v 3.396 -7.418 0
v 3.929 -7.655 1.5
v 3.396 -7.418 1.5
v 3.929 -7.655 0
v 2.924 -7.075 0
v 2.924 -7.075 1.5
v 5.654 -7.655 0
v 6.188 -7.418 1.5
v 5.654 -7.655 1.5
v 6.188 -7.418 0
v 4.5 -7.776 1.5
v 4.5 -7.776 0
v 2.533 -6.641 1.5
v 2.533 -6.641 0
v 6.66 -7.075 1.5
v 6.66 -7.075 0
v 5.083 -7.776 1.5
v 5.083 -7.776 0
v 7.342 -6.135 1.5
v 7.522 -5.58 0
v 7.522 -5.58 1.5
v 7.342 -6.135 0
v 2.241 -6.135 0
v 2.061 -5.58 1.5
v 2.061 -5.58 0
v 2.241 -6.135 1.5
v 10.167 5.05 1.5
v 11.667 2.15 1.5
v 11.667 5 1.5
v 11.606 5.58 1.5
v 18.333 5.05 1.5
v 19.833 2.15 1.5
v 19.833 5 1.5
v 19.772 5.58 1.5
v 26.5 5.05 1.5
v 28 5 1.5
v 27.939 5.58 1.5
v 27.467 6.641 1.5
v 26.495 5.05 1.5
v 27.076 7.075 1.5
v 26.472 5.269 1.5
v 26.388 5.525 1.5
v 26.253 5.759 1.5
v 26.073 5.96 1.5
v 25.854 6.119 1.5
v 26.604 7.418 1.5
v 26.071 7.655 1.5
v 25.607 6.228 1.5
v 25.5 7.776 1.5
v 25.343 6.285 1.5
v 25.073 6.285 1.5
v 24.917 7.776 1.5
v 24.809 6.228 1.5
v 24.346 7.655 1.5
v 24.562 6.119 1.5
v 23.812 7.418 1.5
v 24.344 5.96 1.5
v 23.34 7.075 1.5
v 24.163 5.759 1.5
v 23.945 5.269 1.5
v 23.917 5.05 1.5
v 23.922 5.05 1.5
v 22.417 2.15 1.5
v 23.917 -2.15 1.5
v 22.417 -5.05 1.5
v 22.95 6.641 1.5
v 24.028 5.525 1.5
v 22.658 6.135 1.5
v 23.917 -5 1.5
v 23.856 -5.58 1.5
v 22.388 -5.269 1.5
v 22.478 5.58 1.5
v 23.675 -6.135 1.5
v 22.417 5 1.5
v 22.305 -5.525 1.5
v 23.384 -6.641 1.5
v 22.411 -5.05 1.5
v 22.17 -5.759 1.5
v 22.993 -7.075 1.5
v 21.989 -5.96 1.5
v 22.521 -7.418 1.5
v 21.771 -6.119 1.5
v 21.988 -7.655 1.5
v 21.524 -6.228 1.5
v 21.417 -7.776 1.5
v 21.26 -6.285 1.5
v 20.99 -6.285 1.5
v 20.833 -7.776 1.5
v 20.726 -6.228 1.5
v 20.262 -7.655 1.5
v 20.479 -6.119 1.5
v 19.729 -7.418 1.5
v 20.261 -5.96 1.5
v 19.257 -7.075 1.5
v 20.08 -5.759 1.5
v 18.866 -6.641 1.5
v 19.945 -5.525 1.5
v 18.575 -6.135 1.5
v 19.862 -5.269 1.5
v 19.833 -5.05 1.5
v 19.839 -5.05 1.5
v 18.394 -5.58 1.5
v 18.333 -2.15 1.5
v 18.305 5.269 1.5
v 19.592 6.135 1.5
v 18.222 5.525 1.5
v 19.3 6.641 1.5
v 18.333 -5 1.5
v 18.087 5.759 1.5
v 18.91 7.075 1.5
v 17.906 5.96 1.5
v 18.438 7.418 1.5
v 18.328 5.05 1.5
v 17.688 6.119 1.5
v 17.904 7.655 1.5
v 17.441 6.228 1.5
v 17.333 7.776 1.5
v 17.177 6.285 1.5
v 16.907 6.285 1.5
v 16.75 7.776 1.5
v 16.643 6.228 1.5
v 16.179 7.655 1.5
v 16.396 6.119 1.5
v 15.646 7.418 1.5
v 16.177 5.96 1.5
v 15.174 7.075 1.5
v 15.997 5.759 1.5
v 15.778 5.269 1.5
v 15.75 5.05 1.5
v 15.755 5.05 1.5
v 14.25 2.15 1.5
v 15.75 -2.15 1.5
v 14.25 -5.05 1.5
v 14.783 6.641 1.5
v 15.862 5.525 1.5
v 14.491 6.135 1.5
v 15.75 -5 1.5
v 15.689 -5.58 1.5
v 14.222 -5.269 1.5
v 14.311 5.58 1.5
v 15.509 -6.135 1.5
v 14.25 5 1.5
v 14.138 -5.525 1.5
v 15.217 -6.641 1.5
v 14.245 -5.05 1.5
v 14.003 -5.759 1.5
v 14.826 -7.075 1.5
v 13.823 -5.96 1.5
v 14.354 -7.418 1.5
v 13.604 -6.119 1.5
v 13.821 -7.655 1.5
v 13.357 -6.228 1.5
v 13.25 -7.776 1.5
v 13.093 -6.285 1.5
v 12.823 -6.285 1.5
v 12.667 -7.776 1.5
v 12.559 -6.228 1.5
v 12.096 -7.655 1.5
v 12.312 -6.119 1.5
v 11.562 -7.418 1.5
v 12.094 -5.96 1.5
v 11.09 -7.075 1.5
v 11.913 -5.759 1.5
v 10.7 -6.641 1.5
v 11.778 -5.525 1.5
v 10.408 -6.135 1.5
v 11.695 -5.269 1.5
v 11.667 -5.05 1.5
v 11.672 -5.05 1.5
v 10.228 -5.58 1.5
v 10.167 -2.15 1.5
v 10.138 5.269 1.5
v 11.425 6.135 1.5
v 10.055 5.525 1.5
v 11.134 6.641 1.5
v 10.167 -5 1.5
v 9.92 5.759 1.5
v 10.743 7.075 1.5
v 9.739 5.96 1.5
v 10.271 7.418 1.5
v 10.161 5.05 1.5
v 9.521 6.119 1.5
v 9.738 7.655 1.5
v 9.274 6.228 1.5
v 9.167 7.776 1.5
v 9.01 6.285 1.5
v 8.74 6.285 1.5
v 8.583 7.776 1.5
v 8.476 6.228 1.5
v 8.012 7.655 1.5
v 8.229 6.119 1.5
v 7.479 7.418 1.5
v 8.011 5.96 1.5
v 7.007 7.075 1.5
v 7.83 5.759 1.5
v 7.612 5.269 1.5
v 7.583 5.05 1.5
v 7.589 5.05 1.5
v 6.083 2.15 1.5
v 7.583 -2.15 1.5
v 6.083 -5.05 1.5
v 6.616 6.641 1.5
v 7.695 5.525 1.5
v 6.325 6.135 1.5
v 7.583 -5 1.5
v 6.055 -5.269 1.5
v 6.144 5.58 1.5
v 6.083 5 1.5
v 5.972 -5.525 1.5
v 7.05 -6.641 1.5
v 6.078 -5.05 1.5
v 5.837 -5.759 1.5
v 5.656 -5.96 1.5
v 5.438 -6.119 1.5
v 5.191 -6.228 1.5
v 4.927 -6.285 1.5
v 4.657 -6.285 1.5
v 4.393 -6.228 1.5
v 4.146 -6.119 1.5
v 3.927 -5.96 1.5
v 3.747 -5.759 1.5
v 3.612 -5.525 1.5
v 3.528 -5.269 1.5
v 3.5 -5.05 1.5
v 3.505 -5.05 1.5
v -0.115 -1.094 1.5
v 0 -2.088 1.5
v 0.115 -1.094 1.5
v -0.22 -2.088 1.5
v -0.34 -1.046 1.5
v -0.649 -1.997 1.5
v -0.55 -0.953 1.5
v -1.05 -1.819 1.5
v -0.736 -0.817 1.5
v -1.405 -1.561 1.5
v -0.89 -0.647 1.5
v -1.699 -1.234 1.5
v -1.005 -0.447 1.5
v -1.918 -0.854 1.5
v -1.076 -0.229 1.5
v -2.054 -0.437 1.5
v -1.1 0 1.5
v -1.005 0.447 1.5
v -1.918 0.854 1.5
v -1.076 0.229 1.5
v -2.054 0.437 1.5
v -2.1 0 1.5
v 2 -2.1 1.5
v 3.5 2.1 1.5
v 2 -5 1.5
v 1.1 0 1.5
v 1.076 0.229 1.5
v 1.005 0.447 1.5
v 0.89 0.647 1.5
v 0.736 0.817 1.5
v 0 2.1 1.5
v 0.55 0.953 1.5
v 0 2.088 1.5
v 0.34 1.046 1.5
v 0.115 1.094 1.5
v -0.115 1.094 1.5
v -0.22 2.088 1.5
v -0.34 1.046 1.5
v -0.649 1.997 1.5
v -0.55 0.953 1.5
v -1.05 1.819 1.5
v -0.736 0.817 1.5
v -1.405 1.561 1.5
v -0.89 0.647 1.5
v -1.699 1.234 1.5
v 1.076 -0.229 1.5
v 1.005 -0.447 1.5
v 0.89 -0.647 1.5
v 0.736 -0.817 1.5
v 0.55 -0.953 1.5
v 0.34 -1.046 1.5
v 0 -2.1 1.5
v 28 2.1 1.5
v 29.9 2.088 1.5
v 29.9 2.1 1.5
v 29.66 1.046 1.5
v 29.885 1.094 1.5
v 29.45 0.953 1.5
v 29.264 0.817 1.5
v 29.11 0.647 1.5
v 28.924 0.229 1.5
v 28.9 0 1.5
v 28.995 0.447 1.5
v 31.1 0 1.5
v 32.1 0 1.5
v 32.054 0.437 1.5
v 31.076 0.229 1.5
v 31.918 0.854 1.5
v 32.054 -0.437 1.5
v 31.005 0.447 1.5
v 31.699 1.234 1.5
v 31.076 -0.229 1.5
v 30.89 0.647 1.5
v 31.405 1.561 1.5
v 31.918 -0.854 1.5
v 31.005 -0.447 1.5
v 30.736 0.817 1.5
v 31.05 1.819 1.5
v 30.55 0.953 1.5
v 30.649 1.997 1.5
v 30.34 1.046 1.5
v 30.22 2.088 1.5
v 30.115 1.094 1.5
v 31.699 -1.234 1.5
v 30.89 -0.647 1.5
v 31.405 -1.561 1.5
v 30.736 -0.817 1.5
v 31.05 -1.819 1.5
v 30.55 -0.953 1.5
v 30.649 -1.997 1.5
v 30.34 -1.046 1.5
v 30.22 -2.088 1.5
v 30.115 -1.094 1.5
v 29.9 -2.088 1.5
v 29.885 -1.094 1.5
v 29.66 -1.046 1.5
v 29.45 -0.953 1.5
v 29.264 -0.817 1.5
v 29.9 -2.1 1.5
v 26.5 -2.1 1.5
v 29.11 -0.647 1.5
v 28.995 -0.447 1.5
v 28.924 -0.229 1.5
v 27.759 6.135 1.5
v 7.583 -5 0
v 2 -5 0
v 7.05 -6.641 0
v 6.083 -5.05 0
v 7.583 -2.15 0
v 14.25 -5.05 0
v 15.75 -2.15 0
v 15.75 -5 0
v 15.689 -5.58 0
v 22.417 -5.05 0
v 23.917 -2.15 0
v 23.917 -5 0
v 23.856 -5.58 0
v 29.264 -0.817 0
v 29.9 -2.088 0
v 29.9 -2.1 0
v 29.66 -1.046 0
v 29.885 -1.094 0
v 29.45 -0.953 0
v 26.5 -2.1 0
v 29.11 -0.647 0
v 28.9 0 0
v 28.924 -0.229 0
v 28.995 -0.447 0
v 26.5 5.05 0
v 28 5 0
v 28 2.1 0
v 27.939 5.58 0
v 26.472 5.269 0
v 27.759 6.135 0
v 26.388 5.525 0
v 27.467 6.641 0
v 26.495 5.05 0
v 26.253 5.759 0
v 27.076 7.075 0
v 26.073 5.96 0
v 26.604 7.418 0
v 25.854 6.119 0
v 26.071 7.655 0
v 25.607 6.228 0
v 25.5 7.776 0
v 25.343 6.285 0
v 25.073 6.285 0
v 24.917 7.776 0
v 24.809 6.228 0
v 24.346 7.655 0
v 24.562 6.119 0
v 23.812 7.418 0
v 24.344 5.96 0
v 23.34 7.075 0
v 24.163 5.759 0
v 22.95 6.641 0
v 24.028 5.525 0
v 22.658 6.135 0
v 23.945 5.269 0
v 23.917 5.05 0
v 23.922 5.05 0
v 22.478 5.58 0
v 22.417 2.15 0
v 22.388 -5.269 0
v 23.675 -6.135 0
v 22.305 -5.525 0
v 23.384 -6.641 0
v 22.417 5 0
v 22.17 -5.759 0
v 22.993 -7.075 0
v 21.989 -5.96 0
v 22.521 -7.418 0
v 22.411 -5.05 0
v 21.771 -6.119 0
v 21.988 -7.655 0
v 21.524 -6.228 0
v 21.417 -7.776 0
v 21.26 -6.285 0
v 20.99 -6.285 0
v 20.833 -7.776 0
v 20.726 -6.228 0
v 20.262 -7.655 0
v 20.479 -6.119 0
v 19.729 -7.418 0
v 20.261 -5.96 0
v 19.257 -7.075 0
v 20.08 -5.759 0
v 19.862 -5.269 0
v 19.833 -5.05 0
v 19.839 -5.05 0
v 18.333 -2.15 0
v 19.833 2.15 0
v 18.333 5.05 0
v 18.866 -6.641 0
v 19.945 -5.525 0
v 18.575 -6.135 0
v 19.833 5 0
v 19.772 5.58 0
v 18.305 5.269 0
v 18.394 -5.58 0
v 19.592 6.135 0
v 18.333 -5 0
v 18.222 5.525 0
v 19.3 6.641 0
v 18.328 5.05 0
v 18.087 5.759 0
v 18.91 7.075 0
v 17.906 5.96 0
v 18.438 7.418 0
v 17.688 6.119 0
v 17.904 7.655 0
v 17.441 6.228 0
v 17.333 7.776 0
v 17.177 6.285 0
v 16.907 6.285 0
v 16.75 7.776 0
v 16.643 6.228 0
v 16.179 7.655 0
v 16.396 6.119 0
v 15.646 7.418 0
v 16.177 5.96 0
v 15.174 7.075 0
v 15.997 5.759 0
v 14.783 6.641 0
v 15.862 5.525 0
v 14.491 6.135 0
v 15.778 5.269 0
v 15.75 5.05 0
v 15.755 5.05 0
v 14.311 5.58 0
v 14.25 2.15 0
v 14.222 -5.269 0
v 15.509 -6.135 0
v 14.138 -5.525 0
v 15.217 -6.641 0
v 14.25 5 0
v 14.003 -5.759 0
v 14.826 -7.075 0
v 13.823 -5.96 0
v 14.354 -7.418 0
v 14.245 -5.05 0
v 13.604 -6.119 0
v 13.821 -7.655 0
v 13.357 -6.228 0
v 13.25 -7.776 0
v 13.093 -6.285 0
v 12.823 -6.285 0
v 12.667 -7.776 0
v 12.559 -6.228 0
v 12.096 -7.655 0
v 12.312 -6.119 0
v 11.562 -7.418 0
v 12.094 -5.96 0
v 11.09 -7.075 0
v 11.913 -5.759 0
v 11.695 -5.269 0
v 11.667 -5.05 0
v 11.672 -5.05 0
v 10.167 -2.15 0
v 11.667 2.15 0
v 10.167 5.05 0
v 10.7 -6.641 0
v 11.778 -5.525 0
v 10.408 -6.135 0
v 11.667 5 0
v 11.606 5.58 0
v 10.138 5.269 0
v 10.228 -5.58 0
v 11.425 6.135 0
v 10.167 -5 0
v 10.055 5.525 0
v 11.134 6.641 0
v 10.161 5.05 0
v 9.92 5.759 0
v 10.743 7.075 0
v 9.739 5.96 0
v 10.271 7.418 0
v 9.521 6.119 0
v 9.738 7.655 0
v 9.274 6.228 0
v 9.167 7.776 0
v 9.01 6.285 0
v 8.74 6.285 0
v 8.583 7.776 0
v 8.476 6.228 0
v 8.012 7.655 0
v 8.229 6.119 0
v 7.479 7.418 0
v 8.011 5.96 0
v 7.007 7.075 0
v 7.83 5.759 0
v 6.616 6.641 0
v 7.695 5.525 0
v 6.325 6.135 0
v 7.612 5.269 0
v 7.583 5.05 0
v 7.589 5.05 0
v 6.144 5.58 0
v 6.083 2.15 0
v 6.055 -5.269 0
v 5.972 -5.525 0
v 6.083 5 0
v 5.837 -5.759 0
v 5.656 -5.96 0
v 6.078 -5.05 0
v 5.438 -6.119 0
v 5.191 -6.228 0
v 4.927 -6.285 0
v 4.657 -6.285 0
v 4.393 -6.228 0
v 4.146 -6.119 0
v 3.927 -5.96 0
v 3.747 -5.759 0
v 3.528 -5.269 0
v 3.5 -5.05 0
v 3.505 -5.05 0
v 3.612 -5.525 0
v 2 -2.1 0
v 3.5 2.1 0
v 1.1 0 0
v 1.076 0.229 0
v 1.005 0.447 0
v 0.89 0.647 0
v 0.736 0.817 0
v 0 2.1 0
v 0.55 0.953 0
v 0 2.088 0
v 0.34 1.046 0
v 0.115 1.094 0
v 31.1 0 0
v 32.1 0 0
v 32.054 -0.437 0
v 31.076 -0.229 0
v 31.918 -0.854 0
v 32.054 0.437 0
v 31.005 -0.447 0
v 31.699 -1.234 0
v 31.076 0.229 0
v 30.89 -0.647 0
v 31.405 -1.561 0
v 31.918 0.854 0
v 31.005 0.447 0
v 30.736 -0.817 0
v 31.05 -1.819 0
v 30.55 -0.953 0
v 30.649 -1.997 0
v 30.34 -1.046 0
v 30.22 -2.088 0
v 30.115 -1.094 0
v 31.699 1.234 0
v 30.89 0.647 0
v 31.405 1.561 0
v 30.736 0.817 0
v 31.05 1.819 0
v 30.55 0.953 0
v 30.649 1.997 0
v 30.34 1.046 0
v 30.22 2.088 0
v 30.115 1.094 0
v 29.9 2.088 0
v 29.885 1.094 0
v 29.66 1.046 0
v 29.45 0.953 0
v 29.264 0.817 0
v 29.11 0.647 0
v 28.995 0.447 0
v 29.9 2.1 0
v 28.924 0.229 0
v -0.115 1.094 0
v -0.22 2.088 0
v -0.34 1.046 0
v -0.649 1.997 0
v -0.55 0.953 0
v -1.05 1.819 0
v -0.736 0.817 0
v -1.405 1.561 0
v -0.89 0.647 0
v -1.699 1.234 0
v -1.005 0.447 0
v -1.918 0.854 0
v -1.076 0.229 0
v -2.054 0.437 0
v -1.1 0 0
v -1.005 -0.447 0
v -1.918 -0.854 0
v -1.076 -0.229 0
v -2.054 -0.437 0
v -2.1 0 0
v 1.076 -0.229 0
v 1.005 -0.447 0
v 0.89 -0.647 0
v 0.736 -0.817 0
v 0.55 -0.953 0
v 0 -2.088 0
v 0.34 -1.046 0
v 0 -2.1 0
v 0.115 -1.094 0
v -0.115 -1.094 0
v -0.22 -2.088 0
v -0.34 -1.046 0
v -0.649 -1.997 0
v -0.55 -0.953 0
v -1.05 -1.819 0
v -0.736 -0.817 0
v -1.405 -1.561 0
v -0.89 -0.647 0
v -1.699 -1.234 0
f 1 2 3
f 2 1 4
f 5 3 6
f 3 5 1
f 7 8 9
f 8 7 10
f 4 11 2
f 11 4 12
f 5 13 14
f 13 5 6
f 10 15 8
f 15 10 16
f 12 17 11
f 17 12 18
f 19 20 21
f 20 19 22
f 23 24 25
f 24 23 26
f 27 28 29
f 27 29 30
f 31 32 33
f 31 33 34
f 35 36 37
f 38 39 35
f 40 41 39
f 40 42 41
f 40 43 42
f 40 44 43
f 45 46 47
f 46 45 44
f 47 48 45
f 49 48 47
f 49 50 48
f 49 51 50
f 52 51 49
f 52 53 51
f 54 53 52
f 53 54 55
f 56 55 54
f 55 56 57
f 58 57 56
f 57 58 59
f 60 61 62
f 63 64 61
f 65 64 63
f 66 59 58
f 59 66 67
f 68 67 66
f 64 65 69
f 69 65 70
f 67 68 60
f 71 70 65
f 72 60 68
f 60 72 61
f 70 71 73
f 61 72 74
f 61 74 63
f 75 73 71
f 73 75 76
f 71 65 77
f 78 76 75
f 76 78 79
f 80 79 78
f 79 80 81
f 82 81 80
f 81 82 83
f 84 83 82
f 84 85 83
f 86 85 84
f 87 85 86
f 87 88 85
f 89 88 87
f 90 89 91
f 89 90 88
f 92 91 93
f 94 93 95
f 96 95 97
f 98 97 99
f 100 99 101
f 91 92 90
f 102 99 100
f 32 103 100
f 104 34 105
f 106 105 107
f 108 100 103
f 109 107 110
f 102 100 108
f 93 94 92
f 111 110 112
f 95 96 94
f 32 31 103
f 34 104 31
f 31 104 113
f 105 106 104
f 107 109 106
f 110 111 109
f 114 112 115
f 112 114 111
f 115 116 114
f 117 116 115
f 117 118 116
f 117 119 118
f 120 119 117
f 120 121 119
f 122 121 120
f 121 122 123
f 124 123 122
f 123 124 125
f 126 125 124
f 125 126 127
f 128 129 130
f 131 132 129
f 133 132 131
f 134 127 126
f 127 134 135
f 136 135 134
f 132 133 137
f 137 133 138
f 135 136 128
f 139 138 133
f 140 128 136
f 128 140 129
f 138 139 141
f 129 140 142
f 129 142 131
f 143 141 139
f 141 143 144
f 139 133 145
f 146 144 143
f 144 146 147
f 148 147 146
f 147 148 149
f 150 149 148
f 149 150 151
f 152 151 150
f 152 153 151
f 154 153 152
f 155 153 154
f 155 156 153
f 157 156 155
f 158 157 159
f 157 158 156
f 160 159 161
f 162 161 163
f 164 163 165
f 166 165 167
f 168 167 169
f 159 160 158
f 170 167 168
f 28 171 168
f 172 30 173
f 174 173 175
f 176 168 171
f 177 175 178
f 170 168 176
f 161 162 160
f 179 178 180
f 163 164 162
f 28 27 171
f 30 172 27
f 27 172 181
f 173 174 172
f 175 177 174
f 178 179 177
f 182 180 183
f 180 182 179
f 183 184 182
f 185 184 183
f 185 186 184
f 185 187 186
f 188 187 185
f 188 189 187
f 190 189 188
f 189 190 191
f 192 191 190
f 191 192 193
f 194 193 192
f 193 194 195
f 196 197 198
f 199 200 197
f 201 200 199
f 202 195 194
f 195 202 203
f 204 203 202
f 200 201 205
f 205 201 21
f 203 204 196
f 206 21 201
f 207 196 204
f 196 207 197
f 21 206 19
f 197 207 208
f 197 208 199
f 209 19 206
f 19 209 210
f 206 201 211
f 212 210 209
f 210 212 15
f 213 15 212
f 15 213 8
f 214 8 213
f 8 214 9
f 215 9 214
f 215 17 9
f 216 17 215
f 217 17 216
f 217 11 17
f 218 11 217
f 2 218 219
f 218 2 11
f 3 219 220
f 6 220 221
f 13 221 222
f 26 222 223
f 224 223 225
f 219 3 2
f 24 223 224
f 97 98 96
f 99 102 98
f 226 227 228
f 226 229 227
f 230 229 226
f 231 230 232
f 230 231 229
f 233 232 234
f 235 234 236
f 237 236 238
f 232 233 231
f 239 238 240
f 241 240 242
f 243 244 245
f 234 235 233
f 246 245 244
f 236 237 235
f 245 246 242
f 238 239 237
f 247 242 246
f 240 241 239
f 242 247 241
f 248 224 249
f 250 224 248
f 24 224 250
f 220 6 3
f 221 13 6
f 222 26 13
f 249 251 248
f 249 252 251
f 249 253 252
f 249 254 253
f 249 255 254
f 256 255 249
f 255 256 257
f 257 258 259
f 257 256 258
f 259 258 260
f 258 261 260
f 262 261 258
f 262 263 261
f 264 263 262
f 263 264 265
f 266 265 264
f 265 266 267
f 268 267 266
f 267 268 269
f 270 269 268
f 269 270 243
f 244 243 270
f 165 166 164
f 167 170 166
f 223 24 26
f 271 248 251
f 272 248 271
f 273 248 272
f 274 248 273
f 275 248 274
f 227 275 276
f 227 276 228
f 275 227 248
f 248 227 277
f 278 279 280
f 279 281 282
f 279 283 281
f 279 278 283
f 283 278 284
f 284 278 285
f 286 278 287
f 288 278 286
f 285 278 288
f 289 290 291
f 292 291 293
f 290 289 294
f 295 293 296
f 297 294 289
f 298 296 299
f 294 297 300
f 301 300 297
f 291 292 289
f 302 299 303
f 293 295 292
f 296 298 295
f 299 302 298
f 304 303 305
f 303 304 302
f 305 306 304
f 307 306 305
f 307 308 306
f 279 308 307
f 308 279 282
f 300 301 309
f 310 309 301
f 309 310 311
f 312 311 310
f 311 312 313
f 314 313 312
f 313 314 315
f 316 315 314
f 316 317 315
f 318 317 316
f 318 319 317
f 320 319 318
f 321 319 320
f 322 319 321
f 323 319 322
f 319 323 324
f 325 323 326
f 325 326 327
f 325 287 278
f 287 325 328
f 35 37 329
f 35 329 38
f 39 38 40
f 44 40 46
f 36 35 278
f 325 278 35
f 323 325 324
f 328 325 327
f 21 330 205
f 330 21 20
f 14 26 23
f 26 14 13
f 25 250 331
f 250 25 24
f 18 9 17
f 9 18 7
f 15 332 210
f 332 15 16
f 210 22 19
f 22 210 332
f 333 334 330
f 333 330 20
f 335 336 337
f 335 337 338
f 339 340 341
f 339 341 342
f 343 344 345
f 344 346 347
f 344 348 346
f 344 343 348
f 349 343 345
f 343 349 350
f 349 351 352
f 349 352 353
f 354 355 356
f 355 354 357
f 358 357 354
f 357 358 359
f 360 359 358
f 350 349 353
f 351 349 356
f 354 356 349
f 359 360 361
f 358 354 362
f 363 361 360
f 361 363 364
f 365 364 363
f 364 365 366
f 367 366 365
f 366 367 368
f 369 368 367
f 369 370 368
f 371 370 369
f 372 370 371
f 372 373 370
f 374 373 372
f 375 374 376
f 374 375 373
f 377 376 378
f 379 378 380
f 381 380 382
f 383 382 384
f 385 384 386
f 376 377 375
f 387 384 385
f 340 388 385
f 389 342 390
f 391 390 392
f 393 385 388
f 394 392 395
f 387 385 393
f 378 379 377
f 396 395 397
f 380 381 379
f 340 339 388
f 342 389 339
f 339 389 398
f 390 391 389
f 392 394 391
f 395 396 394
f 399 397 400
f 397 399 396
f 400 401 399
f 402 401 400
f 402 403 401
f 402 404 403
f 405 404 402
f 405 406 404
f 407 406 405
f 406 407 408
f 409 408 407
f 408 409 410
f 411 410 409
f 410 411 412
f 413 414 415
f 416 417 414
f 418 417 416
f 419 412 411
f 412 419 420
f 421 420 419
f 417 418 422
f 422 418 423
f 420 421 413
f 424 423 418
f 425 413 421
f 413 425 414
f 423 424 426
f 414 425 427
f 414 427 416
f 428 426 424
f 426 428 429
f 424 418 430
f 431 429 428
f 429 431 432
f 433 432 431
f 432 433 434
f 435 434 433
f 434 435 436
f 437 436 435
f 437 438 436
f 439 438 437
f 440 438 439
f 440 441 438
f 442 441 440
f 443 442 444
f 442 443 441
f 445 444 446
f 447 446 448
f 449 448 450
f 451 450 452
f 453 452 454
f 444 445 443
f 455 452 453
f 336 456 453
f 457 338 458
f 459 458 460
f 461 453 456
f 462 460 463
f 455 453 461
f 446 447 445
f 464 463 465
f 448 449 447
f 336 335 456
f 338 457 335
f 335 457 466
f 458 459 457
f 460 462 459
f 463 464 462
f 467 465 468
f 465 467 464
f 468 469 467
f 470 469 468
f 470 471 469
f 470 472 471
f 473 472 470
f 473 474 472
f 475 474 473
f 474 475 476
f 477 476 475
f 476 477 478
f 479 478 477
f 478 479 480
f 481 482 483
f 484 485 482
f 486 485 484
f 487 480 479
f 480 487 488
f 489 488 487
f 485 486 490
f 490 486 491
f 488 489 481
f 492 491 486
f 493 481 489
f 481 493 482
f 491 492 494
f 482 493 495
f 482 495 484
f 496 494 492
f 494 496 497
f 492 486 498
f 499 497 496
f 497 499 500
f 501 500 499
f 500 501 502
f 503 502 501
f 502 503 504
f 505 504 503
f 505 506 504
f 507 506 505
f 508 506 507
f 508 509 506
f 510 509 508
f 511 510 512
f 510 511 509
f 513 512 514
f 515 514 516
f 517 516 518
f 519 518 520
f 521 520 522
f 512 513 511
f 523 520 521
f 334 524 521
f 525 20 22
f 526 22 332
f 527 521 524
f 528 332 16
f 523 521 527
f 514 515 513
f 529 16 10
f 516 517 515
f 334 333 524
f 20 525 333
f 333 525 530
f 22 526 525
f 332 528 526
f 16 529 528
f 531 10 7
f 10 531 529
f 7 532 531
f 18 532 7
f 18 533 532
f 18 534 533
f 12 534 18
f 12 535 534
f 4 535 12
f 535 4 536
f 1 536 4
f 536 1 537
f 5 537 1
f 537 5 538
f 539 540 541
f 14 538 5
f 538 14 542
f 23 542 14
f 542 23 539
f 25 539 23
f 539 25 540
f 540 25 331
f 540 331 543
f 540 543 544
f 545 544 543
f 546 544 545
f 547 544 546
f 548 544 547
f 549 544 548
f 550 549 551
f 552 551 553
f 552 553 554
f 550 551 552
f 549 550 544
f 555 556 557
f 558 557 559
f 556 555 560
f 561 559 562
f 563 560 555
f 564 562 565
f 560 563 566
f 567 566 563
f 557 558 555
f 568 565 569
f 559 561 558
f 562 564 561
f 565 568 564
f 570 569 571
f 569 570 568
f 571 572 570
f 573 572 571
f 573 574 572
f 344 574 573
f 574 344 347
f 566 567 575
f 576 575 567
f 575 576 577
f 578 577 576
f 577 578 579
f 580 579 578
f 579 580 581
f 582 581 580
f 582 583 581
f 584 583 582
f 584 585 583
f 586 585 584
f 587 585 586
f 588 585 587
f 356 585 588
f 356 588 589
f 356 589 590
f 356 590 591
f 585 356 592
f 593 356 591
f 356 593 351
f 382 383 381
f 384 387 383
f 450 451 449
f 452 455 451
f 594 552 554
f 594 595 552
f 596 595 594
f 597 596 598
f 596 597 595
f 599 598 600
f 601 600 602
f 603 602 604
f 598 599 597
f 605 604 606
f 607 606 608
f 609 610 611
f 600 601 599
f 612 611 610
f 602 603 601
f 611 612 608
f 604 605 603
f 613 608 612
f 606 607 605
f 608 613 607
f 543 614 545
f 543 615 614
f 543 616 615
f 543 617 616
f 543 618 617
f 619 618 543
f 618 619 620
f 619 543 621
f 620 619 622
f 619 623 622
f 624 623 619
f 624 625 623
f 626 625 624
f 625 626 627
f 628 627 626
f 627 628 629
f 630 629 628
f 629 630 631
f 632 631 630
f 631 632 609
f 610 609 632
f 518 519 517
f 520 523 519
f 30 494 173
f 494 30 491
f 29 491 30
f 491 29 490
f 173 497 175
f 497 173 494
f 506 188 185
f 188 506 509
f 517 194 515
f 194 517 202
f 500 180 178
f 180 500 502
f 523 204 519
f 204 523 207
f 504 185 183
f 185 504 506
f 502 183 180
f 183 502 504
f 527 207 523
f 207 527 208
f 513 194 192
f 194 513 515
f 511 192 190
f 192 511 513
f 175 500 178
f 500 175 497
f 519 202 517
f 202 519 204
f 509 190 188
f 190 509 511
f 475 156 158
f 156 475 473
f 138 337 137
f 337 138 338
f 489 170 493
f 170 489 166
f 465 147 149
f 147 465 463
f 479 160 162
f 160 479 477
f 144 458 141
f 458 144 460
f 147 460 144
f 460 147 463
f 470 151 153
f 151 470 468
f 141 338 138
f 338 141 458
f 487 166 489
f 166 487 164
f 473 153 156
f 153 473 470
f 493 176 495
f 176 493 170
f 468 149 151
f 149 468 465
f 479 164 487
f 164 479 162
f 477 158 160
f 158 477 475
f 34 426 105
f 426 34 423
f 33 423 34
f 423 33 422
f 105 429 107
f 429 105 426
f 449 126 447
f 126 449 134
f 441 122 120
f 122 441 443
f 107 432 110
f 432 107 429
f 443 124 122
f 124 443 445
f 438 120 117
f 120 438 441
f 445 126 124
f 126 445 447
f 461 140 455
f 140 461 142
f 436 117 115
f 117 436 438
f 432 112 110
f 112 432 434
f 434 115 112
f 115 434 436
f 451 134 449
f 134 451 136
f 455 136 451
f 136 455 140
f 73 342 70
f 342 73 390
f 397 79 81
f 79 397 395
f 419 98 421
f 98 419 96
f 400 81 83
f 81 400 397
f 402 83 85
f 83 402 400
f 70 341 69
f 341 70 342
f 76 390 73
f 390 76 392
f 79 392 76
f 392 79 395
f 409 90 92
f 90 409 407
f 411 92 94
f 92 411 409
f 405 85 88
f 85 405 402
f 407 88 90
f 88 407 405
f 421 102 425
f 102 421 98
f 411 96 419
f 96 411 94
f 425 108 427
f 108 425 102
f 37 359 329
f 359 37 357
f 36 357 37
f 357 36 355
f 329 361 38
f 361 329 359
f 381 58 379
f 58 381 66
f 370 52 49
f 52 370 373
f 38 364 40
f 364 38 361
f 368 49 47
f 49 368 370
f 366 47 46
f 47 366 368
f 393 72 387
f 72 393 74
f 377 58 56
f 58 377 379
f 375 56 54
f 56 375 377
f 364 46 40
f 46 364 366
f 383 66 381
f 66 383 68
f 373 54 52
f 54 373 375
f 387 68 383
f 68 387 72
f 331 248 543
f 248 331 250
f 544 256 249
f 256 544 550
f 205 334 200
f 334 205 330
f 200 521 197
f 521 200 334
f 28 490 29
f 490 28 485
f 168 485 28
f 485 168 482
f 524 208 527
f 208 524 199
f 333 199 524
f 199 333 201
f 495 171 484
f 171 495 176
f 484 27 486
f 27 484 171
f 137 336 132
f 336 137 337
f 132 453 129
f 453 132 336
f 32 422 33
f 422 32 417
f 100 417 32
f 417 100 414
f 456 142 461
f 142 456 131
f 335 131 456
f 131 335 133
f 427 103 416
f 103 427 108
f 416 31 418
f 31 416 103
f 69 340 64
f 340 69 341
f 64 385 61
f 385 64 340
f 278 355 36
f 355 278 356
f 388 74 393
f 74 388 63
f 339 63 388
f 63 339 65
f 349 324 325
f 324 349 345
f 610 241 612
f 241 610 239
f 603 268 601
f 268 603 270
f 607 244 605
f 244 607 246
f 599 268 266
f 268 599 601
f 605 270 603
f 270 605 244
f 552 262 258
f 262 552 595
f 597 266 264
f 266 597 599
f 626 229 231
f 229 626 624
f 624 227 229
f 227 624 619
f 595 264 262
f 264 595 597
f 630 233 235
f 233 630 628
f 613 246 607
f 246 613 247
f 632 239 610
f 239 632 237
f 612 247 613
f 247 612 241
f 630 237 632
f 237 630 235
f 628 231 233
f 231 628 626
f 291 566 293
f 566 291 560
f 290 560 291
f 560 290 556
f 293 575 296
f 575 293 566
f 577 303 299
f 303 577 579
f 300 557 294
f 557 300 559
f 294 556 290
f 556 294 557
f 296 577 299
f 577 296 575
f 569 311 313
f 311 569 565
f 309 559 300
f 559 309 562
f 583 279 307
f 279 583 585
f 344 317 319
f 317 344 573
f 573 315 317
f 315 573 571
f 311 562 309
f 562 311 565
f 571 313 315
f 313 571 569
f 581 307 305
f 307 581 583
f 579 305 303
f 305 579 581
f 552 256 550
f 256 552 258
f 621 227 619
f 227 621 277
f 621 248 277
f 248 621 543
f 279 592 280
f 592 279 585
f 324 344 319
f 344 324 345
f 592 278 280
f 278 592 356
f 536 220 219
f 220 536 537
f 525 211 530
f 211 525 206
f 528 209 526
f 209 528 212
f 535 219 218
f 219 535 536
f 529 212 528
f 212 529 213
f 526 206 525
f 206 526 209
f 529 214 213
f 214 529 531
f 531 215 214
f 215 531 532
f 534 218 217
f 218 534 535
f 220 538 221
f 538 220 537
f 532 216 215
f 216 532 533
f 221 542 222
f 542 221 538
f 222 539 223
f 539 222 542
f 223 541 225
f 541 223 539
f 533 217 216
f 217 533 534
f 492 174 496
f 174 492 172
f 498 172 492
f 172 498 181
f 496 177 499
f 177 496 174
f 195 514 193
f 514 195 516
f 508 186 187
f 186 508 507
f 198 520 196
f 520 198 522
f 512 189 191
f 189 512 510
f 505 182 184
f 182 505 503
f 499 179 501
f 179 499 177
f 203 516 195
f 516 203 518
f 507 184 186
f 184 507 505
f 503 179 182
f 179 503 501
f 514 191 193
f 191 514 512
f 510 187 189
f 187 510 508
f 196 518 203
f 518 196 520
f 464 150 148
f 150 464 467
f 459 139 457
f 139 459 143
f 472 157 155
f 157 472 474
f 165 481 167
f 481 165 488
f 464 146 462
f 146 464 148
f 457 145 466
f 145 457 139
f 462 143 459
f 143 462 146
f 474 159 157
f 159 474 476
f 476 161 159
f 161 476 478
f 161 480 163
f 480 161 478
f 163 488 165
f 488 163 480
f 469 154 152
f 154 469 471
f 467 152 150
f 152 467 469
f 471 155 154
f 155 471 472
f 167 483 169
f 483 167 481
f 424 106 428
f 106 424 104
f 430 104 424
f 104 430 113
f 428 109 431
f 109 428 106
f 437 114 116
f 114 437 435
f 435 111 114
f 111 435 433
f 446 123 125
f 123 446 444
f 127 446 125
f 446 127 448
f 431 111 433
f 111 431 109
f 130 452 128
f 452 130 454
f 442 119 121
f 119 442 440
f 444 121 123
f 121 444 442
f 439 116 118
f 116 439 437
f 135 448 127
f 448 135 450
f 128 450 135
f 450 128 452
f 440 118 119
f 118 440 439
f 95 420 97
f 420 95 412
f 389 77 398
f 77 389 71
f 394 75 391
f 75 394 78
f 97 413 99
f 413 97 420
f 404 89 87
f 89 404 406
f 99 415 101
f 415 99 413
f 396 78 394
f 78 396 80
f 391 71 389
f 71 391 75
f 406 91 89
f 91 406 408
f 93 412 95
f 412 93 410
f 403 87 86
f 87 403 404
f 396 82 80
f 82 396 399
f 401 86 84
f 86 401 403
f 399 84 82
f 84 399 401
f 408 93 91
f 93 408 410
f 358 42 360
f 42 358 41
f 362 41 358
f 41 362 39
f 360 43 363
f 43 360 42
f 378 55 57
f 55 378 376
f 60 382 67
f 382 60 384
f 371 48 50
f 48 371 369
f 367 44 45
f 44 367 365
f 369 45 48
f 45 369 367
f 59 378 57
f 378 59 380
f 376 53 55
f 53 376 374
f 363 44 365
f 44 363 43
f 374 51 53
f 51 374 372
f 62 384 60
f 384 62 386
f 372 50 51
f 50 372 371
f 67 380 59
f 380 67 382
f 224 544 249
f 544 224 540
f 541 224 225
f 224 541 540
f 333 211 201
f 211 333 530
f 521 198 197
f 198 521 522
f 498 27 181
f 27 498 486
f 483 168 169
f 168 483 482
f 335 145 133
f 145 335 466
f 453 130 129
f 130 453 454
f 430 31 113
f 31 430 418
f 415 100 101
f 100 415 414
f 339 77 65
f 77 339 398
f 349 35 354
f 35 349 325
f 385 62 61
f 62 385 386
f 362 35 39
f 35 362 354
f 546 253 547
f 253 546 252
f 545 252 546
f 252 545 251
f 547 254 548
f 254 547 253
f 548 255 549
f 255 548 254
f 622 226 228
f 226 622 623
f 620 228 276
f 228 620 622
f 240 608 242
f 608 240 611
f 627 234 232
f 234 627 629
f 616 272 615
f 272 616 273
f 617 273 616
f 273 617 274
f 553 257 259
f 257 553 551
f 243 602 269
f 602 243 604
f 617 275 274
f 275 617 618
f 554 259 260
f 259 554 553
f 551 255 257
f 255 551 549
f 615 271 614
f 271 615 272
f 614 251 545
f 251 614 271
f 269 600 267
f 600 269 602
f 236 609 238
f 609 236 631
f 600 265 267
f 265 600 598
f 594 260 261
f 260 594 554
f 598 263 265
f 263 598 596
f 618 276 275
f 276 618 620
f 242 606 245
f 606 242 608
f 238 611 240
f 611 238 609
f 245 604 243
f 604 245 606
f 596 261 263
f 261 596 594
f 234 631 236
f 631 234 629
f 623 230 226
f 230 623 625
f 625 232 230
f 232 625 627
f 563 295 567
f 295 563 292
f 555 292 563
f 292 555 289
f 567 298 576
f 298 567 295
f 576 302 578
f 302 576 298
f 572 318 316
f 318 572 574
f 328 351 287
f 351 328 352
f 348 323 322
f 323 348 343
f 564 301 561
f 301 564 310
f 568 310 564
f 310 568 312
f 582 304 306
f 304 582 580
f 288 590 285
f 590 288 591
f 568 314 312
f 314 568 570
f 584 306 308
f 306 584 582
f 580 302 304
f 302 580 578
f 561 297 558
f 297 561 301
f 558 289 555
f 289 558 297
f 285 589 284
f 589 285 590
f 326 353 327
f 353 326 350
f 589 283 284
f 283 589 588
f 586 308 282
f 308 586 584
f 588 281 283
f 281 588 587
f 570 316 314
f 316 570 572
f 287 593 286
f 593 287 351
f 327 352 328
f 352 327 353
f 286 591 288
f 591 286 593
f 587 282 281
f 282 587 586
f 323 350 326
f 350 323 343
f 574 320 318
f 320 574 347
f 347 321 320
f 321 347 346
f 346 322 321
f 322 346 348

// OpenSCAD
$fn = 30;

ScrewHoleDistance = 30;
springAmplitude = 10;
springHeight = 1.5;
springThreadWidth = 1.5;
springPhaseCount = 6;
springScrewHoleDiameter = 2.2;
mountDist = 2.0;

springLength = ScrewHoleDistance-((mountDist)*2); //-(springThreadWidth*2);

springSegmentLength = (springLength)/springPhaseCount;



springInnerRadius = (springLength-(springThreadWidth*(springPhaseCount+1)))/springPhaseCount;

springOuterRadius = springInnerRadius+(springThreadWidth*2);

echo(springSegmentLength);


// mounting

mountingRingRadius = (springScrewHoleDiameter/2)+1;
difference() {
	union() {
		translate([0,0,0]) cylinder(h = springHeight, r=mountingRingRadius);
		translate([ScrewHoleDistance,0,0]) cylinder(h = springHeight, r=(springScrewHoleDiameter/2)+1);
		
		translate([0,-mountingRingRadius,0]) cube(size = [mountDist+springThreadWidth,mountingRingRadius*2,springHeight], center = false);

		translate([ScrewHoleDistance-mountingRingRadius-springThreadWidth,-mountingRingRadius,0]) cube(size = [mountDist+springThreadWidth,mountingRingRadius*2,springHeight], center = false);

		SpringBase();
	}

	translate([0,0,-0.5]) cylinder(h = springHeight+1, r=(springScrewHoleDiameter/2));
	translate([ScrewHoleDistance,0,-0.5]) cylinder(h = springHeight+1, r=(springScrewHoleDiameter/2));

	SpringBaseRemove();
	
}



module SpringBase() {
	shift = (springOuterRadius/2)+mountDist;
	for(i=[0:springPhaseCount-1]) {
		translate([(i*(springOuterRadius-springThreadWidth))+shift,((i%2)*springAmplitude)-(springAmplitude/2),0]) cylinder(h = springHeight, r=(springOuterRadius/2));
	}



	shift2 = mountDist;
	translate([0,0,springHeight/2])
	for(i=[0:springPhaseCount-1]) {
		rotate(a=[((i%2)*180)+180,0,0])
		translate([(i*(springInnerRadius+springThreadWidth))+shift2,-mountingRingRadius,springHeight/-2]) 
			cube(size = [springOuterRadius,mountingRingRadius+(springAmplitude/2),springHeight], center = false);
	}
}




module SpringBaseRemove() {
	shift = (springInnerRadius/2)+mountDist+springThreadWidth;
	for(i=[0:springPhaseCount-1]) {
		translate([(i*(springInnerRadius+springThreadWidth))+shift,((i%2)*springAmplitude)-(springAmplitude/2),-0.5]) cylinder(h = springHeight+1, r=(springInnerRadius/2));
	}

	shift2 = mountDist+springThreadWidth;
	translate([0,0,springHeight/2])
	for(i=[0:springPhaseCount-1]) {
		rotate(a=[((i%2)*180)+180,0,0])
		translate([(i*(springInnerRadius+springThreadWidth))+shift2,-mountingRingRadius-0.05,(springHeight/-2)-0.5]) 
			cube(size = [springInnerRadius,mountingRingRadius+(springAmplitude/2)+0.1,springHeight+1], center = false);
	}

}
